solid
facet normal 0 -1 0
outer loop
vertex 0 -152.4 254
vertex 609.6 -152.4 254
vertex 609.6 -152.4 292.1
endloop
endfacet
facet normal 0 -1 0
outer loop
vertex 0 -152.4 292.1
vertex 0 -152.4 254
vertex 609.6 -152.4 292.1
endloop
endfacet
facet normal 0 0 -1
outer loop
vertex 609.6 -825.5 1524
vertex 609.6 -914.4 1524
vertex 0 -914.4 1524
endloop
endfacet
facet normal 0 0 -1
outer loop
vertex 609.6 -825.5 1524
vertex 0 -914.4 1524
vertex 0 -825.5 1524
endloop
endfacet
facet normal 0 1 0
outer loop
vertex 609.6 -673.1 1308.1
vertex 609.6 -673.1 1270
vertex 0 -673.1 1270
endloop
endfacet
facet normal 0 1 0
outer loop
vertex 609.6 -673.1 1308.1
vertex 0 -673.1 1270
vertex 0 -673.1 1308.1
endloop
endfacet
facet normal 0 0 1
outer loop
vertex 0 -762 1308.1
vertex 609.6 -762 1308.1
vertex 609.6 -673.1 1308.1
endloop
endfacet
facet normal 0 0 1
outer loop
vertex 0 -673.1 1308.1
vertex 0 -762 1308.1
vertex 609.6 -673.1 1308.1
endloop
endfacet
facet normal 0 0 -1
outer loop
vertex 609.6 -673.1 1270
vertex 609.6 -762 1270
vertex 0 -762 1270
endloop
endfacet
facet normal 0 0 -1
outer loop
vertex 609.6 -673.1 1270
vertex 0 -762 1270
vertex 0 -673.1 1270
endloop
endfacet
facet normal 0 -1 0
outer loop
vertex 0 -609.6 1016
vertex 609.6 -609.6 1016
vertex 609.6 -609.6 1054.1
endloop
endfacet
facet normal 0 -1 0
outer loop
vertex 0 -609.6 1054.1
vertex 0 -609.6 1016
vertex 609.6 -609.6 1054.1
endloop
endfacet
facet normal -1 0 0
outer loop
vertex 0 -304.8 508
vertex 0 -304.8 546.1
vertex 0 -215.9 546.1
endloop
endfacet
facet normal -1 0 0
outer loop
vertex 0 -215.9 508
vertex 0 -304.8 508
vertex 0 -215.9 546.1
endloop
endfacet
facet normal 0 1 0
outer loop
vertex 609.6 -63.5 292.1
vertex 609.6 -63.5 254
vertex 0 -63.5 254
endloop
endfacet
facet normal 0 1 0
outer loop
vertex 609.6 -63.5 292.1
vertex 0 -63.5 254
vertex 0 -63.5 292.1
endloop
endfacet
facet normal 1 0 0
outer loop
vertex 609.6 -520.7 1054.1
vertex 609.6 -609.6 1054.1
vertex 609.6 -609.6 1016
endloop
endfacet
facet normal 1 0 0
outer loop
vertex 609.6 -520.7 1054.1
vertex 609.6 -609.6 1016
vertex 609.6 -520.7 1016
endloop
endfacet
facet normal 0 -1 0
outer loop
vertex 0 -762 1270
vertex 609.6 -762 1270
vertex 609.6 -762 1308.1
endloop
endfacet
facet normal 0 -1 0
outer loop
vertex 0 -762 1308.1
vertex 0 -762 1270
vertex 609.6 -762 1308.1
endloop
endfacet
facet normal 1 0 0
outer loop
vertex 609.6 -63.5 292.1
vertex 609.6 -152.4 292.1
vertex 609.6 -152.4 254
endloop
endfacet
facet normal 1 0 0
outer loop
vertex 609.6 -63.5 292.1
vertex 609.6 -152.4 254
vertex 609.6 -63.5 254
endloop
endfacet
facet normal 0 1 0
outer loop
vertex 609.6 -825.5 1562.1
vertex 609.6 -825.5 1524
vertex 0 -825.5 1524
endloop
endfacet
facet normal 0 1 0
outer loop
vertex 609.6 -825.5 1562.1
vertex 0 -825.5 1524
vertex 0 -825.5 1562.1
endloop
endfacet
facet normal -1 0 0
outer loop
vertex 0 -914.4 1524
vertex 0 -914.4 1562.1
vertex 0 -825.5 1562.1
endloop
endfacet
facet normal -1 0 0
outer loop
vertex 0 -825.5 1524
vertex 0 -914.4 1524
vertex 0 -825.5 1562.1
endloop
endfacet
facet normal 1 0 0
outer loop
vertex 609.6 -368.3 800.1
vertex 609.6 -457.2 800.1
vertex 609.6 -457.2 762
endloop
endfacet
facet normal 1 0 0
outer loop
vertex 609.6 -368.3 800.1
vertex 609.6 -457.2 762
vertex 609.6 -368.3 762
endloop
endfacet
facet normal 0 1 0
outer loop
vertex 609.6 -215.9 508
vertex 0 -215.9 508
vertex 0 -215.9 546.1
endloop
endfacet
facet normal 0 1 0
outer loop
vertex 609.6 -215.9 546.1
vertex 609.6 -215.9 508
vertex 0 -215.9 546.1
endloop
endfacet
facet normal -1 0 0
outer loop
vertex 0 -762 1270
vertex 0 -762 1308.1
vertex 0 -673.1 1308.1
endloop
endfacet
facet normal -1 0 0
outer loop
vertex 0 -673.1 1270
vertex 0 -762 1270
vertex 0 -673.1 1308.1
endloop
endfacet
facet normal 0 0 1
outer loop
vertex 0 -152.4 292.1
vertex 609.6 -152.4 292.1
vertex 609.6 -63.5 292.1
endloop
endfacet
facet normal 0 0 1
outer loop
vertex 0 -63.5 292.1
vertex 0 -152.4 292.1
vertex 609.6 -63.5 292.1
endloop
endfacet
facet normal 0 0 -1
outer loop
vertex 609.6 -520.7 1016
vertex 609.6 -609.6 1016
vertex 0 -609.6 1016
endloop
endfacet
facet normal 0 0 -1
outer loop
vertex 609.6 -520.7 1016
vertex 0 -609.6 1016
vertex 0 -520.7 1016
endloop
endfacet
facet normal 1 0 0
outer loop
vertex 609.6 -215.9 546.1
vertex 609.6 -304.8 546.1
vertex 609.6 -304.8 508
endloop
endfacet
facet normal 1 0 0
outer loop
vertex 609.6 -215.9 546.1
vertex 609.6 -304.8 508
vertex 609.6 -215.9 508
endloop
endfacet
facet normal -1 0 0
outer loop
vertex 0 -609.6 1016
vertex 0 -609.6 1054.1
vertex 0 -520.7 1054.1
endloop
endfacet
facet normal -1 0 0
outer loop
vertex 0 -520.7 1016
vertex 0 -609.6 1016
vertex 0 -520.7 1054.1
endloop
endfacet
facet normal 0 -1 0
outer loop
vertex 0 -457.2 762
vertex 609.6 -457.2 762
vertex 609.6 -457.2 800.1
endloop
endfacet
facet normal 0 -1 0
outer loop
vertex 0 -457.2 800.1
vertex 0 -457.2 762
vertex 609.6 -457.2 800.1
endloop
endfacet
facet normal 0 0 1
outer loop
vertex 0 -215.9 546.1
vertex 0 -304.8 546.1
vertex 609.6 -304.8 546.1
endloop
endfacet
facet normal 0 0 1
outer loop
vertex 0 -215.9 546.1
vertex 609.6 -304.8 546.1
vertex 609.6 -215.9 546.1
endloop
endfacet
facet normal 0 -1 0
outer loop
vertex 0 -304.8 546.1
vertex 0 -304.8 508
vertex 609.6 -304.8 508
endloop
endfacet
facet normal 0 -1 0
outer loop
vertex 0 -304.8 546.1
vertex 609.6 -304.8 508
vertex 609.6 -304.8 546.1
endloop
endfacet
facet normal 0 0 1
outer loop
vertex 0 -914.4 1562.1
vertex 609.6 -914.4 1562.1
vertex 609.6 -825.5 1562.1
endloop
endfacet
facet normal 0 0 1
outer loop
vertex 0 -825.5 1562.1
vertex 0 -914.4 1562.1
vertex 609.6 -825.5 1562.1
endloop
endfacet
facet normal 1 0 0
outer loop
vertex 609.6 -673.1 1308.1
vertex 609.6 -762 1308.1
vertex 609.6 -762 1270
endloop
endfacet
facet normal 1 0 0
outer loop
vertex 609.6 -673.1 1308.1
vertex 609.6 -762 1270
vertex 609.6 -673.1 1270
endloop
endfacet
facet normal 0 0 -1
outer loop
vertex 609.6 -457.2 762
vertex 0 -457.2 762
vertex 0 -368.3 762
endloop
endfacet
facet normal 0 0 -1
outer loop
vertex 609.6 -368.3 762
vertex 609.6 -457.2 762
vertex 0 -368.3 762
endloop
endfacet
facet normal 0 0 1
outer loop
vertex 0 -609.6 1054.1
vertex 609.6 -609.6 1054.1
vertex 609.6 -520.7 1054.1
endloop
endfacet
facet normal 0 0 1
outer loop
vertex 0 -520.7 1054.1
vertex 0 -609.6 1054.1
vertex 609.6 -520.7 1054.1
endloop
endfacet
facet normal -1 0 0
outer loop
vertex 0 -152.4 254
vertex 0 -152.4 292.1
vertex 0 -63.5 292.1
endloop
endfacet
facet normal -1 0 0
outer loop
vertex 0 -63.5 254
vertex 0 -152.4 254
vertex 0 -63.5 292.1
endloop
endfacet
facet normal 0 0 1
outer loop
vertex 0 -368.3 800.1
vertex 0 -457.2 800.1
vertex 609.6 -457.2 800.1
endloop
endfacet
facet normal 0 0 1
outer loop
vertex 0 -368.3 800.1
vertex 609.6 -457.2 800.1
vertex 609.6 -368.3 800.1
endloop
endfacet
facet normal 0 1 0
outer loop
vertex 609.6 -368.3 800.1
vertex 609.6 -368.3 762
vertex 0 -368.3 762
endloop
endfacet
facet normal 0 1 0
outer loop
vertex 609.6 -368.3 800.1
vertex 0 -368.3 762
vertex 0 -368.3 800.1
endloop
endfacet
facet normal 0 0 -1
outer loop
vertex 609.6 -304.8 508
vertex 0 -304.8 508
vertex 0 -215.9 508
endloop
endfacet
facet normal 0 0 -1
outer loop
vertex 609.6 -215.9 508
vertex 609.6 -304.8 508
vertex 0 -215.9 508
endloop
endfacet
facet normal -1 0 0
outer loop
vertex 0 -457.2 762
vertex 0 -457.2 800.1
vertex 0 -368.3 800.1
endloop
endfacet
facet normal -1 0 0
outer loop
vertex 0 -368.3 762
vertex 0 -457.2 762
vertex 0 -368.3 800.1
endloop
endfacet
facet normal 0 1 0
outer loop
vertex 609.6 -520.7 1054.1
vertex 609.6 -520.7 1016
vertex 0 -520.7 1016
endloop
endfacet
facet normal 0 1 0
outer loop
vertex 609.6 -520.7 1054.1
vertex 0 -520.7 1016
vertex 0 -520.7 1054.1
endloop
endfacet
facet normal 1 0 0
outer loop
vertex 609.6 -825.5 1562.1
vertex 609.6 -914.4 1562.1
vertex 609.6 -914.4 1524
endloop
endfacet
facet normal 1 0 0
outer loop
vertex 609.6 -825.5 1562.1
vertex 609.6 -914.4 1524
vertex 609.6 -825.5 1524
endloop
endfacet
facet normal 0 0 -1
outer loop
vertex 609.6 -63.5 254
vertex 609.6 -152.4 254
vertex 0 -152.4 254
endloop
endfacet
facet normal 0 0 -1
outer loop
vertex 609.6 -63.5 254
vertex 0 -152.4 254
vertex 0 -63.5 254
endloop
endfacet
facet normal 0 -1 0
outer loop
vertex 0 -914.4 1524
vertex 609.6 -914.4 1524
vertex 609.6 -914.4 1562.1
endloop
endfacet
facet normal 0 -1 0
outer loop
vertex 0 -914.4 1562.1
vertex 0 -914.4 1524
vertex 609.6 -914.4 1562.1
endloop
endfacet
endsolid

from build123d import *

# Parameters (mm, degrees)
F0_W     = 88.9
F0_H     = 38.1
F1_DEPTH = 609.6


with BuildPart() as f1:
    # F0 (on Right) → F1 (new body)
    with BuildSketch(Plane.YZ):
        with Locations((-107.95, 273.05)):
            Rectangle(F0_W, F0_H)
        with Locations((-260.35, 527.05)):
            Rectangle(F0_W, F0_H)
        with Locations((-412.75, 781.05)):
            Rectangle(F0_W, F0_H)
        with Locations((-565.15, 1035.05)):
            Rectangle(F0_W, F0_H)
        with Locations((-717.55, 1289.05)):
            Rectangle(F0_W, F0_H)
        with Locations((-869.95, 1543.05)):
            Rectangle(F0_W, F0_H)
    extrude(amount=F1_DEPTH)


solid = f1.part
